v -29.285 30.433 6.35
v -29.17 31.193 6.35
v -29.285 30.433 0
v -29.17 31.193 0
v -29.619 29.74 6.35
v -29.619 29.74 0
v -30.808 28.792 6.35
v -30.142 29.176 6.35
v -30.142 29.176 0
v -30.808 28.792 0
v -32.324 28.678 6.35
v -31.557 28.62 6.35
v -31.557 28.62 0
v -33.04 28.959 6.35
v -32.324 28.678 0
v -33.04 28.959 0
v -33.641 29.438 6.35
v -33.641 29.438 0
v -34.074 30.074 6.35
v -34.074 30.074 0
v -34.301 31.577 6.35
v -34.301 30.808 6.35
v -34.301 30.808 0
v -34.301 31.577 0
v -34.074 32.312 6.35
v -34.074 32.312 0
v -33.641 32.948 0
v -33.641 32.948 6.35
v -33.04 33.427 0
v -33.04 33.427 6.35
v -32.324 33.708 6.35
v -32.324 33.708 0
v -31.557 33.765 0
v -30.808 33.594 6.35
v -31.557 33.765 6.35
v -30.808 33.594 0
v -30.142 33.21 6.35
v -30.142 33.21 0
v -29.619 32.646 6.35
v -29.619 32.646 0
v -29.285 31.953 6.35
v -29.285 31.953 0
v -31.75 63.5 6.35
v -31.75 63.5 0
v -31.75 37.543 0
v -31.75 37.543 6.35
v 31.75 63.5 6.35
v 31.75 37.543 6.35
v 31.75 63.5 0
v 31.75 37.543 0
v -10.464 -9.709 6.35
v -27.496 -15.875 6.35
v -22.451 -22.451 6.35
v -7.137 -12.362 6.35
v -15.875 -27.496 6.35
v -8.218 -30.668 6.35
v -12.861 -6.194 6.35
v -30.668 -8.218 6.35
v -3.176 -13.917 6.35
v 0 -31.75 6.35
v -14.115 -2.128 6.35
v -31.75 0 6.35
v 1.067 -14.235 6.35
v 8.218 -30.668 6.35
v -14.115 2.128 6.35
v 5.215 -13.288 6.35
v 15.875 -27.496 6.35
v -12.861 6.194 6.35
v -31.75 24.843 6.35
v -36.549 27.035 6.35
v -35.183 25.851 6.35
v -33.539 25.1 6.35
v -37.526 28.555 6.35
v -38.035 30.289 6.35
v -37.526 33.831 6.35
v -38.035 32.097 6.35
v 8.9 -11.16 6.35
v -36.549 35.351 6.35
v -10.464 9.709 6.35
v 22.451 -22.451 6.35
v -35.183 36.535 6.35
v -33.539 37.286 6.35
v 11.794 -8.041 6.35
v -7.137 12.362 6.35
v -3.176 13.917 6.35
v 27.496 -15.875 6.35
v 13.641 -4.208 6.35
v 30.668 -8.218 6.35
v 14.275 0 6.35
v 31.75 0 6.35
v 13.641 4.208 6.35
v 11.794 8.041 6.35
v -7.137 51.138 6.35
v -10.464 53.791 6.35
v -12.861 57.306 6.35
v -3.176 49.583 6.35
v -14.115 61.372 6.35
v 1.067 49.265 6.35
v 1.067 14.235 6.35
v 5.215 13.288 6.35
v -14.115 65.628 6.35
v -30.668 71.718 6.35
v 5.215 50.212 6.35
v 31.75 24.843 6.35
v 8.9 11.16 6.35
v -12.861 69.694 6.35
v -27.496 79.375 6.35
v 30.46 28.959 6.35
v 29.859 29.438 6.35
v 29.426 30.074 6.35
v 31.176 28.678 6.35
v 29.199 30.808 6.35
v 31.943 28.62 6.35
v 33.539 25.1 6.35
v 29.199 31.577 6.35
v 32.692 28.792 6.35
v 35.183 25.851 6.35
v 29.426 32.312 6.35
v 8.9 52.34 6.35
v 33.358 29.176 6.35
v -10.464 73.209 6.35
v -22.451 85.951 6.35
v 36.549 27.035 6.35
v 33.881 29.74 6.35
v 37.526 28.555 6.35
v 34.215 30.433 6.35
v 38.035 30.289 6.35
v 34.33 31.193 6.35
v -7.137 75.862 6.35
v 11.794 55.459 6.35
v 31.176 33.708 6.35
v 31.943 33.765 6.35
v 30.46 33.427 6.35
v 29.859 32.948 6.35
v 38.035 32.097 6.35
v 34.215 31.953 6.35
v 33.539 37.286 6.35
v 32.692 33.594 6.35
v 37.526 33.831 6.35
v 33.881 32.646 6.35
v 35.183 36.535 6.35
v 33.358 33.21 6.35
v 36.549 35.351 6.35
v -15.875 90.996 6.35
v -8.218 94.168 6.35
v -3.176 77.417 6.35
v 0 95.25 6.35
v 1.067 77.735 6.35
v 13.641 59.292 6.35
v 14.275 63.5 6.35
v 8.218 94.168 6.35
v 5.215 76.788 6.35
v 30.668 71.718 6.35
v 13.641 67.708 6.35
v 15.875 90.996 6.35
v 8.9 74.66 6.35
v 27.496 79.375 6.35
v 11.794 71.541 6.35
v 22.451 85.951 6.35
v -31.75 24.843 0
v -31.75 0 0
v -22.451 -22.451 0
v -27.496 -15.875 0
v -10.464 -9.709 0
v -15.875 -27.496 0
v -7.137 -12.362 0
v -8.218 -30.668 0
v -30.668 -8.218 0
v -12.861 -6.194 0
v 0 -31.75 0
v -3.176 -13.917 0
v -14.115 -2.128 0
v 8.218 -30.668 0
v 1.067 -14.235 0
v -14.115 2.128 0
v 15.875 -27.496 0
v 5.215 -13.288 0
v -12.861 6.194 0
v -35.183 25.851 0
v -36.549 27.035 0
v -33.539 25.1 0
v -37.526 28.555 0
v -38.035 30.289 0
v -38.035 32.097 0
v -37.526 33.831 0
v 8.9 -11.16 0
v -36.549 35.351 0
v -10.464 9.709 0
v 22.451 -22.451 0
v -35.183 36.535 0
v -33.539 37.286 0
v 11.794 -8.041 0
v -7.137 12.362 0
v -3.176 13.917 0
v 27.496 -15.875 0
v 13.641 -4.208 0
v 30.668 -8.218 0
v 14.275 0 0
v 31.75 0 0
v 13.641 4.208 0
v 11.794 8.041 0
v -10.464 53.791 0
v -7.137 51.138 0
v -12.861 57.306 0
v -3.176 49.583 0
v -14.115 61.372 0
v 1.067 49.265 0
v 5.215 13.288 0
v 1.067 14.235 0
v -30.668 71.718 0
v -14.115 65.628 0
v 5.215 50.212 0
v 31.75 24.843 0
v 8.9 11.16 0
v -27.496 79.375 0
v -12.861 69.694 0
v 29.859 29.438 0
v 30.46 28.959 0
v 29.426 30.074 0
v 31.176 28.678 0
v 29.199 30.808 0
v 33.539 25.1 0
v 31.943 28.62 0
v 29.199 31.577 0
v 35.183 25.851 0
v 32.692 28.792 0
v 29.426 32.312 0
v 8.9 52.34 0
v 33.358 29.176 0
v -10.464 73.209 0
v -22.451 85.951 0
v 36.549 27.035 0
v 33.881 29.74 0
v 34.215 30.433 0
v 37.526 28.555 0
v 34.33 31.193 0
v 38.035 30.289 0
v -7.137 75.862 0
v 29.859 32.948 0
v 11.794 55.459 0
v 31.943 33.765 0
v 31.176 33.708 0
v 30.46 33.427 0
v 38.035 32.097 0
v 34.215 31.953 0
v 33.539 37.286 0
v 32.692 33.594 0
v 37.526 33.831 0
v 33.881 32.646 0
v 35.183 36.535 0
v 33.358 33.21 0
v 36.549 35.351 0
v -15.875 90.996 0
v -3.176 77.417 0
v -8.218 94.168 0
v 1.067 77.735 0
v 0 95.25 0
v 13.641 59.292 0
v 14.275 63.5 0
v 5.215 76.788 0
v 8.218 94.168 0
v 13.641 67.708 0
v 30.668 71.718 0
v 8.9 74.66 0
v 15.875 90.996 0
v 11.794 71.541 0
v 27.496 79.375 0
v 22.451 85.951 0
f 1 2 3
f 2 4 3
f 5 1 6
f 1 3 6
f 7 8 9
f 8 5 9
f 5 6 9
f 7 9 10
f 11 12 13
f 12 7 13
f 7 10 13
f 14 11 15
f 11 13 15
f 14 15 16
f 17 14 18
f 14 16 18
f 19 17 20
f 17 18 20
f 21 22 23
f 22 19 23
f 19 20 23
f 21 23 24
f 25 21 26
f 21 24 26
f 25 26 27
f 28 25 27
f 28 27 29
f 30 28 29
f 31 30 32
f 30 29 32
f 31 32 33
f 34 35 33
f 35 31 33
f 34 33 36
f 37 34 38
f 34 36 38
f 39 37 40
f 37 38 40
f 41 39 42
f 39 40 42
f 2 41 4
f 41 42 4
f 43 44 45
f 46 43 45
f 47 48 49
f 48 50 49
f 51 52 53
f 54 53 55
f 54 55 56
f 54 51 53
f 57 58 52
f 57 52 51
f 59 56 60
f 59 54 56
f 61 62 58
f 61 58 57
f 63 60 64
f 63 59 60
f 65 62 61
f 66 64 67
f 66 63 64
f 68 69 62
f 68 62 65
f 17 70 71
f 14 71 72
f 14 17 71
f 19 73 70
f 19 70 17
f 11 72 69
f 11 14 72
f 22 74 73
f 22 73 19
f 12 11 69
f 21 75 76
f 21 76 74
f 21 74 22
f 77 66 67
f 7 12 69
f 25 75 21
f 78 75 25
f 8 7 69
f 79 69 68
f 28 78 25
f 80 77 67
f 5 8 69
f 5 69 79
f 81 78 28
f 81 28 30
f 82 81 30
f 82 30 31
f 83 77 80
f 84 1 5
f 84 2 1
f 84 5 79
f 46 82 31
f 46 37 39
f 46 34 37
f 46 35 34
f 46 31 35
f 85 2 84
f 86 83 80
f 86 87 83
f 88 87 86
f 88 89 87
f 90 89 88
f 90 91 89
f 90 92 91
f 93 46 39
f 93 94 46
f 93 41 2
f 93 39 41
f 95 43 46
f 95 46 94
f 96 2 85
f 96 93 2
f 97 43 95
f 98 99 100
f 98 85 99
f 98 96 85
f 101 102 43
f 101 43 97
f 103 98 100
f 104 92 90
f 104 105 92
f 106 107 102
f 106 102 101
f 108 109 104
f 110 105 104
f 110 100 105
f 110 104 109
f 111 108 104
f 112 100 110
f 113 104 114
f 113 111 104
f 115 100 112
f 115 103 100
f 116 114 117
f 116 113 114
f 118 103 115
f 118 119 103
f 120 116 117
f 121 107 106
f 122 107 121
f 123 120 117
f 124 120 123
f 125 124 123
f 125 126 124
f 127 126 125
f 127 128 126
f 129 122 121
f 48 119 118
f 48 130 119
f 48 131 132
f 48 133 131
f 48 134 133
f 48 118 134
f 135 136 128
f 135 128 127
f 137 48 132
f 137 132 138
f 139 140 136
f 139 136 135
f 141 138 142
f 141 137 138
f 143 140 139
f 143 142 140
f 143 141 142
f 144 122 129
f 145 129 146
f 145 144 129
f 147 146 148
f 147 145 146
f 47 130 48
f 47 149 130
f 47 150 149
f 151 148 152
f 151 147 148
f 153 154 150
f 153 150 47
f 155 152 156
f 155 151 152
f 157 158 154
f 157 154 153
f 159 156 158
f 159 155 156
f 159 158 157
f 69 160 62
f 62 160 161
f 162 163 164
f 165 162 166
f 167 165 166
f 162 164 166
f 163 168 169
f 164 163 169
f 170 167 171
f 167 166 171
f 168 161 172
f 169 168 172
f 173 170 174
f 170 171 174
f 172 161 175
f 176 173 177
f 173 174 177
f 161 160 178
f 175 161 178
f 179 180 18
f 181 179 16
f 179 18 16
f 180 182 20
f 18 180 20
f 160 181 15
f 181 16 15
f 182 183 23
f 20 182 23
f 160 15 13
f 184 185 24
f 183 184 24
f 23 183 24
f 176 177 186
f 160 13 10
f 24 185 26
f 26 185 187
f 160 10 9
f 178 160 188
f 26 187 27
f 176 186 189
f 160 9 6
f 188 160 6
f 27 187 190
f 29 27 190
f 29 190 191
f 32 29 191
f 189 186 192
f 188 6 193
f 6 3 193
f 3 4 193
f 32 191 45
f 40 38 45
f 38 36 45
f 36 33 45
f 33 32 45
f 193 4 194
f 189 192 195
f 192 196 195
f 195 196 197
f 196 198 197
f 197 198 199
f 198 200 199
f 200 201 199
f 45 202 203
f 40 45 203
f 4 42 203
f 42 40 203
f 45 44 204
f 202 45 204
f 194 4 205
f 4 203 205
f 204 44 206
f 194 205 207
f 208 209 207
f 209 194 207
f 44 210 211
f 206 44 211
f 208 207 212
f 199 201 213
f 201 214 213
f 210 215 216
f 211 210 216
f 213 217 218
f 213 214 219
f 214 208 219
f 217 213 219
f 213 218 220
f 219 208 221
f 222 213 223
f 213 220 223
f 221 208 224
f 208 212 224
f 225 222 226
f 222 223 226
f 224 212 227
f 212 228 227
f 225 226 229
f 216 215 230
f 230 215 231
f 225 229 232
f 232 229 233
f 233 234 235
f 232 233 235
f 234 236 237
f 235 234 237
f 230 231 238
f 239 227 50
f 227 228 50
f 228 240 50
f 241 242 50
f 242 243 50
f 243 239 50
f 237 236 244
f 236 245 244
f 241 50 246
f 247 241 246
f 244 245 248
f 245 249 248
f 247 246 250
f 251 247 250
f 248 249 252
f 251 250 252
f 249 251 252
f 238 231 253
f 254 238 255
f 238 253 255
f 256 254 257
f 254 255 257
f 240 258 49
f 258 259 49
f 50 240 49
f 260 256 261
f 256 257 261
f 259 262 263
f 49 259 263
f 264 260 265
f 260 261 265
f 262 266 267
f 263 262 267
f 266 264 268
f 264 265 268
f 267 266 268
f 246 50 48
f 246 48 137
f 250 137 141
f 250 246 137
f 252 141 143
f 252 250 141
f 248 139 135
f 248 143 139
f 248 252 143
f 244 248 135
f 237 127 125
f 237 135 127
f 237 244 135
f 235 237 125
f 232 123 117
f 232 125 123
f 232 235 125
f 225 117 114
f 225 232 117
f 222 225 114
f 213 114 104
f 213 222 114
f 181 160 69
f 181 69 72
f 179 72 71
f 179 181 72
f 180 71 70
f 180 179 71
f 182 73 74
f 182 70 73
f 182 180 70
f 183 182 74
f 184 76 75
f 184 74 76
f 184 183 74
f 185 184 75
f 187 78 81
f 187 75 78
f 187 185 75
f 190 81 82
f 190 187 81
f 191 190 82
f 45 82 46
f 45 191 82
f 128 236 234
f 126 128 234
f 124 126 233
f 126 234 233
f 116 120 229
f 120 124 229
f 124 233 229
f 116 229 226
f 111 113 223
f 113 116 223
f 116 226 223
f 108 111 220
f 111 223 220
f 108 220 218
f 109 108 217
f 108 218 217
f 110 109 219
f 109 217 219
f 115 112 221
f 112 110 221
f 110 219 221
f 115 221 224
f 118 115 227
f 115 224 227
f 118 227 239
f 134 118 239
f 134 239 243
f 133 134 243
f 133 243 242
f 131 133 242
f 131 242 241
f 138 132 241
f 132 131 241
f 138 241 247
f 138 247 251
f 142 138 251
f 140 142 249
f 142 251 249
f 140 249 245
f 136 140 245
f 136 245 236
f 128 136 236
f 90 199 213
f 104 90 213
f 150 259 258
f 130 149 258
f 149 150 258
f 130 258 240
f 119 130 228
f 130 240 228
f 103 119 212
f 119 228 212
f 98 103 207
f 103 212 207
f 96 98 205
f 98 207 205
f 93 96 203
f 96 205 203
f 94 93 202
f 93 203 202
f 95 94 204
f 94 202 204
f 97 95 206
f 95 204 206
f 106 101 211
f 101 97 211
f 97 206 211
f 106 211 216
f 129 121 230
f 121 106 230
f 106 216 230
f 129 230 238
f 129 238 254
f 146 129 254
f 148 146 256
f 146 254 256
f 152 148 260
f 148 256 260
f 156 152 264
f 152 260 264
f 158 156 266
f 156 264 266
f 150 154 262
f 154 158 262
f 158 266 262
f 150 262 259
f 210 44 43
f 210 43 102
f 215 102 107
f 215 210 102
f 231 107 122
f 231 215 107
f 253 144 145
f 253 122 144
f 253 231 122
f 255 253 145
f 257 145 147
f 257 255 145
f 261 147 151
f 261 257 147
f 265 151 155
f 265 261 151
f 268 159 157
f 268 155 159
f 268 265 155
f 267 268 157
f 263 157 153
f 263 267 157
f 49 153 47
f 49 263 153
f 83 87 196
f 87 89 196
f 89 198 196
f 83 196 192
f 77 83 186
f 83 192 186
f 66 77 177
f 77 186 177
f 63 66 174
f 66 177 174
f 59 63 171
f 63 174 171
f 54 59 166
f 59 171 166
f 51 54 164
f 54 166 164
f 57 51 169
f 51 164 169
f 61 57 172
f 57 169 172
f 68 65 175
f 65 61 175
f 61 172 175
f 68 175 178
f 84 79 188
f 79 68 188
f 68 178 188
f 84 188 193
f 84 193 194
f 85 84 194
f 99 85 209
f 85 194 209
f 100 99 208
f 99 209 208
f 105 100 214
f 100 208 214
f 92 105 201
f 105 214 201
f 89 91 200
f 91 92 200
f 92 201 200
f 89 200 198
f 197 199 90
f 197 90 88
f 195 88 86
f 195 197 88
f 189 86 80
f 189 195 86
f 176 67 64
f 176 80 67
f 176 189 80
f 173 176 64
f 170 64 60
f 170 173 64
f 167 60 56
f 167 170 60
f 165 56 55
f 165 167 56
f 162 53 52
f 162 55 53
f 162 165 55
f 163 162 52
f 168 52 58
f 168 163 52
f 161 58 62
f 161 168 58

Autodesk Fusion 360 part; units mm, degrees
sketch "Sketch1" plane through (0, 0, 0) normal (0, 0, 1) x (1, 0, 0)
  arc A0 (31.75, 63.5) -> (-31.75, 63.5) centre (0, 63.5) ccw
  arc A1 (-31.75, 0) -> (31.75, 0) centre (0, 0) ccw
  line L0 (0, 0) -> (0, 63.5) construction
  circle A2 centre (0, 63.5) radius 14.2748
  circle A3 centre (0, 0) radius 14.2748
  arc A4 (-31.75, 37.5429) -> (-31.75, 24.8429) centre (-31.75, 31.1929) ccw
  arc A5 (31.75, 24.8429) -> (31.75, 37.5429) centre (31.75, 31.1929) ccw
  line L1 (-31.75, 63.5) -> (-31.75, 37.5429)
  line L2 (-31.75, 24.8429) -> (-31.75, 0)
  line L3 (31.75, 0) -> (31.75, 24.8429)
  line L4 (31.75, 37.5429) -> (31.75, 63.5)
  circle A6 centre (0, 0) radius 31.75 construction
  circle A7 centre (0, 63.5) radius 31.75 construction
  circle A8 centre (31.75, 31.1929) radius 2.5797
  circle A9 centre (-31.75, 31.1929) radius 2.5797
  dimension "d1" = 63.5
  dimension "d2" = 28.5496
  dimension "d3" = 28.5496
  dimension "d4" = 63.5
  dimension "d5" = 12.7
  dimension "d6" = 12.7
  dimension "d7" = 63.5
  dimension "d8" = 63.5
  dimension "d9" = 5.1594
  dimension "d10" = 5.1594
extrude "Extrude1" add sketch "Sketch1" along normal blind 6.35
equation "d9 = ( 13 / 64 ) * 1 in"
equation "d10 = ( 13 / 64 ) * 1 in"
